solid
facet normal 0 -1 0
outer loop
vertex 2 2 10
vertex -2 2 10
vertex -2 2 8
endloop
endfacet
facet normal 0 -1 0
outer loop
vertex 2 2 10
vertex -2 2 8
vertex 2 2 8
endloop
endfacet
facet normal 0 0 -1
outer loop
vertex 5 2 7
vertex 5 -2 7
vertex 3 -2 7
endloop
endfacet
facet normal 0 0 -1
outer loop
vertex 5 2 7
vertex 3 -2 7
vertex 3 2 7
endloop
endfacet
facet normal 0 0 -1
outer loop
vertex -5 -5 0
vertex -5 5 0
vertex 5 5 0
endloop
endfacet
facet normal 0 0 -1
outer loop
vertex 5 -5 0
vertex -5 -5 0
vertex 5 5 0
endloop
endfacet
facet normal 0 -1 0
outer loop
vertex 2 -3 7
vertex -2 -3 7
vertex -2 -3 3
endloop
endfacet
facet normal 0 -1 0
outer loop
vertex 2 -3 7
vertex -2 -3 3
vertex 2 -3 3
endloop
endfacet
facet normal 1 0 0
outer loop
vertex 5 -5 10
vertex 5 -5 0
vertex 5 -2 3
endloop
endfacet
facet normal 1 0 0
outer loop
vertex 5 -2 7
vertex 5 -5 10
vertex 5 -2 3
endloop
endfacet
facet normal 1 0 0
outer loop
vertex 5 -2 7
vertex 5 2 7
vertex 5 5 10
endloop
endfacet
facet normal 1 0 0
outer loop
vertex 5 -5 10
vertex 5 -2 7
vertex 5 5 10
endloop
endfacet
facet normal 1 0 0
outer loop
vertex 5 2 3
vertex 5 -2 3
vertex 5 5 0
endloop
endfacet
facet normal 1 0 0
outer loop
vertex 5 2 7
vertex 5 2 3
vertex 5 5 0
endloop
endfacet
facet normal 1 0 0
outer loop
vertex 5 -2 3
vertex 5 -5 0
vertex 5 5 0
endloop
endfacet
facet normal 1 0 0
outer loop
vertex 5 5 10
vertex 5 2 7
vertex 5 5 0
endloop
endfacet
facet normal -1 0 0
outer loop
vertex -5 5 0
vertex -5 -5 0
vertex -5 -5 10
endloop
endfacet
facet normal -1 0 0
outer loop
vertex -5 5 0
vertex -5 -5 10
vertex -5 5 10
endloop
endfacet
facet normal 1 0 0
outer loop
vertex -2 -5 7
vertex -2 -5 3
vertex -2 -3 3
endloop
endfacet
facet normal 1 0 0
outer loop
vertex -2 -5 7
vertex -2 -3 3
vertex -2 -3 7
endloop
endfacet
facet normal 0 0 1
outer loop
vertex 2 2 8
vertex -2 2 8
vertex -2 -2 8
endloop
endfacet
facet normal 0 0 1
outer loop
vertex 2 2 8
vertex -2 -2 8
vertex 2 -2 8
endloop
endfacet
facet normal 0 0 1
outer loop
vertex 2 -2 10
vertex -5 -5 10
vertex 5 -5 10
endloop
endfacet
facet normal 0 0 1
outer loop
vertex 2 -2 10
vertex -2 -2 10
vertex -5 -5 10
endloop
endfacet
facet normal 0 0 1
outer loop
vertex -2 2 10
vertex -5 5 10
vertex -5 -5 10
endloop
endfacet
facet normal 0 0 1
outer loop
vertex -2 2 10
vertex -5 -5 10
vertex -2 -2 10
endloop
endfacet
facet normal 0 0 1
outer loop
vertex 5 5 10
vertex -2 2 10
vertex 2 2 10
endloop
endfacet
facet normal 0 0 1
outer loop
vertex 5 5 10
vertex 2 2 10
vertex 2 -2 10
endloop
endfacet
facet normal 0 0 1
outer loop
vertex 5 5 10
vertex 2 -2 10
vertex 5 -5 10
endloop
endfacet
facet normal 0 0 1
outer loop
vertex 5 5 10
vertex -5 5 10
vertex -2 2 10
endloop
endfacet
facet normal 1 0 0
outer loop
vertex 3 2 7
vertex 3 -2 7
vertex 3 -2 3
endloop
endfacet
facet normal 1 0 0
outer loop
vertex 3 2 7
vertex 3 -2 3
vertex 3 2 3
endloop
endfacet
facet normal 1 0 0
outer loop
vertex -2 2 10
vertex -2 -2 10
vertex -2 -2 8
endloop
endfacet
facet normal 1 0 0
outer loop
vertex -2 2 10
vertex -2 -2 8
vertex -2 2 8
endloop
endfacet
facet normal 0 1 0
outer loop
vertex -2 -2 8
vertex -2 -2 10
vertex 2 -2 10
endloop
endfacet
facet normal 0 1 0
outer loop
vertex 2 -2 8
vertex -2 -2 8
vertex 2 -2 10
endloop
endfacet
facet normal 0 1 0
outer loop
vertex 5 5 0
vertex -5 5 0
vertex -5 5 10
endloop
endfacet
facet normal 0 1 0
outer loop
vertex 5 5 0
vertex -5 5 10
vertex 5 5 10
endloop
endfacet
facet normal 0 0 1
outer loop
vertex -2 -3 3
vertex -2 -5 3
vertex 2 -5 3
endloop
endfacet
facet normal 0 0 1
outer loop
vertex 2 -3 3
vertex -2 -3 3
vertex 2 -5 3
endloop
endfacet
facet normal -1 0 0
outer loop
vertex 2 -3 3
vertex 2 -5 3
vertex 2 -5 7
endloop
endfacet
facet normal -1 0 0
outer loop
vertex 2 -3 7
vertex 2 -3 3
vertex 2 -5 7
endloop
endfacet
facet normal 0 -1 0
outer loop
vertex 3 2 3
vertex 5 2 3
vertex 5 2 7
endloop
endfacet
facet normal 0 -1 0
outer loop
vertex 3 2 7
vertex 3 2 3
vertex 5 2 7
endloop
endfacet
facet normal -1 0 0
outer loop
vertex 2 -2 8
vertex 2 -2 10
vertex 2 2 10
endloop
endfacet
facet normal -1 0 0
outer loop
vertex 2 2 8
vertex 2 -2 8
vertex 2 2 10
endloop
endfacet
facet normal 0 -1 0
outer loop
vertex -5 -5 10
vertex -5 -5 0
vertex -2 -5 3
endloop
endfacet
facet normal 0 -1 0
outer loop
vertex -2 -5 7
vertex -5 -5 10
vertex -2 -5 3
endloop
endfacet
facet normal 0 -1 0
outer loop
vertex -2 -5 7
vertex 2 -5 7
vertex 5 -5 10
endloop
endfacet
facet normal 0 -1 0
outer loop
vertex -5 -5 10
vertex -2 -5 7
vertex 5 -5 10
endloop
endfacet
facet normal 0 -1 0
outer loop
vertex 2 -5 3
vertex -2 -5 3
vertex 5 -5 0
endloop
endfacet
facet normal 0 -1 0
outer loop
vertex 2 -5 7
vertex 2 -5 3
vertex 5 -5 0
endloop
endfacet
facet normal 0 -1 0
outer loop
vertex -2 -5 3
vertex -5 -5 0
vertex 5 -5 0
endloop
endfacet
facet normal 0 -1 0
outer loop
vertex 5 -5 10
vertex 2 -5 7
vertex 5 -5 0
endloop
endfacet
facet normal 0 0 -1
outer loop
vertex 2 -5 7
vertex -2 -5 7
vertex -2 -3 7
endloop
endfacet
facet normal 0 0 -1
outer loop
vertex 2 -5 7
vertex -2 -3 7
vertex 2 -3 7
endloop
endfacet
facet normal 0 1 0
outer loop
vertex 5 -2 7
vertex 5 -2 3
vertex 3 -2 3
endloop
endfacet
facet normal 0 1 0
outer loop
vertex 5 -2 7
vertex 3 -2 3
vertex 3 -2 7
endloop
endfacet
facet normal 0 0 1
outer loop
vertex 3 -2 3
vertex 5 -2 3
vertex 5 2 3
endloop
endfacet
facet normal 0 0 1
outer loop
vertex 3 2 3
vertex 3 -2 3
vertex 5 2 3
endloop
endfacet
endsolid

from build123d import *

# Parameters (mm, degrees)
F0_W     = 10
F0_H     = 10
F1_DEPTH = 10
F2_W     = 4
F2_H     = 4
F3_DEPTH = 2
F4_W     = 4
F4_H     = 4
F6_DEPTH = 2
F5_W     = 4
F5_H     = 4
F7_DEPTH = 2


with BuildPart() as f1:
    # F0 (on Top) → F1 (new body)
    with BuildSketch(Plane.XY):
        Rectangle(F0_W, F0_H)
    extrude(amount=F1_DEPTH)

    # F2 (on face) → F3 (cut)
    with BuildSketch(Plane.YZ.offset(5)):
        with Locations((0, 5)):
            Rectangle(F2_W, F2_H)
    extrude(amount=-F3_DEPTH, mode=Mode.SUBTRACT)

    # F4 (on face) → F6 (cut)
    with BuildSketch(Plane.XZ.offset(5)):
        with Locations((0, 5)):
            Rectangle(F4_W, F4_H)
    extrude(amount=-F6_DEPTH, mode=Mode.SUBTRACT)

    # F5 (on face) → F7 (cut)
    with BuildSketch(Plane.XY.offset(10)):
        Rectangle(F5_W, F5_H)
    extrude(amount=-F7_DEPTH, mode=Mode.SUBTRACT)


solid = f1.part
